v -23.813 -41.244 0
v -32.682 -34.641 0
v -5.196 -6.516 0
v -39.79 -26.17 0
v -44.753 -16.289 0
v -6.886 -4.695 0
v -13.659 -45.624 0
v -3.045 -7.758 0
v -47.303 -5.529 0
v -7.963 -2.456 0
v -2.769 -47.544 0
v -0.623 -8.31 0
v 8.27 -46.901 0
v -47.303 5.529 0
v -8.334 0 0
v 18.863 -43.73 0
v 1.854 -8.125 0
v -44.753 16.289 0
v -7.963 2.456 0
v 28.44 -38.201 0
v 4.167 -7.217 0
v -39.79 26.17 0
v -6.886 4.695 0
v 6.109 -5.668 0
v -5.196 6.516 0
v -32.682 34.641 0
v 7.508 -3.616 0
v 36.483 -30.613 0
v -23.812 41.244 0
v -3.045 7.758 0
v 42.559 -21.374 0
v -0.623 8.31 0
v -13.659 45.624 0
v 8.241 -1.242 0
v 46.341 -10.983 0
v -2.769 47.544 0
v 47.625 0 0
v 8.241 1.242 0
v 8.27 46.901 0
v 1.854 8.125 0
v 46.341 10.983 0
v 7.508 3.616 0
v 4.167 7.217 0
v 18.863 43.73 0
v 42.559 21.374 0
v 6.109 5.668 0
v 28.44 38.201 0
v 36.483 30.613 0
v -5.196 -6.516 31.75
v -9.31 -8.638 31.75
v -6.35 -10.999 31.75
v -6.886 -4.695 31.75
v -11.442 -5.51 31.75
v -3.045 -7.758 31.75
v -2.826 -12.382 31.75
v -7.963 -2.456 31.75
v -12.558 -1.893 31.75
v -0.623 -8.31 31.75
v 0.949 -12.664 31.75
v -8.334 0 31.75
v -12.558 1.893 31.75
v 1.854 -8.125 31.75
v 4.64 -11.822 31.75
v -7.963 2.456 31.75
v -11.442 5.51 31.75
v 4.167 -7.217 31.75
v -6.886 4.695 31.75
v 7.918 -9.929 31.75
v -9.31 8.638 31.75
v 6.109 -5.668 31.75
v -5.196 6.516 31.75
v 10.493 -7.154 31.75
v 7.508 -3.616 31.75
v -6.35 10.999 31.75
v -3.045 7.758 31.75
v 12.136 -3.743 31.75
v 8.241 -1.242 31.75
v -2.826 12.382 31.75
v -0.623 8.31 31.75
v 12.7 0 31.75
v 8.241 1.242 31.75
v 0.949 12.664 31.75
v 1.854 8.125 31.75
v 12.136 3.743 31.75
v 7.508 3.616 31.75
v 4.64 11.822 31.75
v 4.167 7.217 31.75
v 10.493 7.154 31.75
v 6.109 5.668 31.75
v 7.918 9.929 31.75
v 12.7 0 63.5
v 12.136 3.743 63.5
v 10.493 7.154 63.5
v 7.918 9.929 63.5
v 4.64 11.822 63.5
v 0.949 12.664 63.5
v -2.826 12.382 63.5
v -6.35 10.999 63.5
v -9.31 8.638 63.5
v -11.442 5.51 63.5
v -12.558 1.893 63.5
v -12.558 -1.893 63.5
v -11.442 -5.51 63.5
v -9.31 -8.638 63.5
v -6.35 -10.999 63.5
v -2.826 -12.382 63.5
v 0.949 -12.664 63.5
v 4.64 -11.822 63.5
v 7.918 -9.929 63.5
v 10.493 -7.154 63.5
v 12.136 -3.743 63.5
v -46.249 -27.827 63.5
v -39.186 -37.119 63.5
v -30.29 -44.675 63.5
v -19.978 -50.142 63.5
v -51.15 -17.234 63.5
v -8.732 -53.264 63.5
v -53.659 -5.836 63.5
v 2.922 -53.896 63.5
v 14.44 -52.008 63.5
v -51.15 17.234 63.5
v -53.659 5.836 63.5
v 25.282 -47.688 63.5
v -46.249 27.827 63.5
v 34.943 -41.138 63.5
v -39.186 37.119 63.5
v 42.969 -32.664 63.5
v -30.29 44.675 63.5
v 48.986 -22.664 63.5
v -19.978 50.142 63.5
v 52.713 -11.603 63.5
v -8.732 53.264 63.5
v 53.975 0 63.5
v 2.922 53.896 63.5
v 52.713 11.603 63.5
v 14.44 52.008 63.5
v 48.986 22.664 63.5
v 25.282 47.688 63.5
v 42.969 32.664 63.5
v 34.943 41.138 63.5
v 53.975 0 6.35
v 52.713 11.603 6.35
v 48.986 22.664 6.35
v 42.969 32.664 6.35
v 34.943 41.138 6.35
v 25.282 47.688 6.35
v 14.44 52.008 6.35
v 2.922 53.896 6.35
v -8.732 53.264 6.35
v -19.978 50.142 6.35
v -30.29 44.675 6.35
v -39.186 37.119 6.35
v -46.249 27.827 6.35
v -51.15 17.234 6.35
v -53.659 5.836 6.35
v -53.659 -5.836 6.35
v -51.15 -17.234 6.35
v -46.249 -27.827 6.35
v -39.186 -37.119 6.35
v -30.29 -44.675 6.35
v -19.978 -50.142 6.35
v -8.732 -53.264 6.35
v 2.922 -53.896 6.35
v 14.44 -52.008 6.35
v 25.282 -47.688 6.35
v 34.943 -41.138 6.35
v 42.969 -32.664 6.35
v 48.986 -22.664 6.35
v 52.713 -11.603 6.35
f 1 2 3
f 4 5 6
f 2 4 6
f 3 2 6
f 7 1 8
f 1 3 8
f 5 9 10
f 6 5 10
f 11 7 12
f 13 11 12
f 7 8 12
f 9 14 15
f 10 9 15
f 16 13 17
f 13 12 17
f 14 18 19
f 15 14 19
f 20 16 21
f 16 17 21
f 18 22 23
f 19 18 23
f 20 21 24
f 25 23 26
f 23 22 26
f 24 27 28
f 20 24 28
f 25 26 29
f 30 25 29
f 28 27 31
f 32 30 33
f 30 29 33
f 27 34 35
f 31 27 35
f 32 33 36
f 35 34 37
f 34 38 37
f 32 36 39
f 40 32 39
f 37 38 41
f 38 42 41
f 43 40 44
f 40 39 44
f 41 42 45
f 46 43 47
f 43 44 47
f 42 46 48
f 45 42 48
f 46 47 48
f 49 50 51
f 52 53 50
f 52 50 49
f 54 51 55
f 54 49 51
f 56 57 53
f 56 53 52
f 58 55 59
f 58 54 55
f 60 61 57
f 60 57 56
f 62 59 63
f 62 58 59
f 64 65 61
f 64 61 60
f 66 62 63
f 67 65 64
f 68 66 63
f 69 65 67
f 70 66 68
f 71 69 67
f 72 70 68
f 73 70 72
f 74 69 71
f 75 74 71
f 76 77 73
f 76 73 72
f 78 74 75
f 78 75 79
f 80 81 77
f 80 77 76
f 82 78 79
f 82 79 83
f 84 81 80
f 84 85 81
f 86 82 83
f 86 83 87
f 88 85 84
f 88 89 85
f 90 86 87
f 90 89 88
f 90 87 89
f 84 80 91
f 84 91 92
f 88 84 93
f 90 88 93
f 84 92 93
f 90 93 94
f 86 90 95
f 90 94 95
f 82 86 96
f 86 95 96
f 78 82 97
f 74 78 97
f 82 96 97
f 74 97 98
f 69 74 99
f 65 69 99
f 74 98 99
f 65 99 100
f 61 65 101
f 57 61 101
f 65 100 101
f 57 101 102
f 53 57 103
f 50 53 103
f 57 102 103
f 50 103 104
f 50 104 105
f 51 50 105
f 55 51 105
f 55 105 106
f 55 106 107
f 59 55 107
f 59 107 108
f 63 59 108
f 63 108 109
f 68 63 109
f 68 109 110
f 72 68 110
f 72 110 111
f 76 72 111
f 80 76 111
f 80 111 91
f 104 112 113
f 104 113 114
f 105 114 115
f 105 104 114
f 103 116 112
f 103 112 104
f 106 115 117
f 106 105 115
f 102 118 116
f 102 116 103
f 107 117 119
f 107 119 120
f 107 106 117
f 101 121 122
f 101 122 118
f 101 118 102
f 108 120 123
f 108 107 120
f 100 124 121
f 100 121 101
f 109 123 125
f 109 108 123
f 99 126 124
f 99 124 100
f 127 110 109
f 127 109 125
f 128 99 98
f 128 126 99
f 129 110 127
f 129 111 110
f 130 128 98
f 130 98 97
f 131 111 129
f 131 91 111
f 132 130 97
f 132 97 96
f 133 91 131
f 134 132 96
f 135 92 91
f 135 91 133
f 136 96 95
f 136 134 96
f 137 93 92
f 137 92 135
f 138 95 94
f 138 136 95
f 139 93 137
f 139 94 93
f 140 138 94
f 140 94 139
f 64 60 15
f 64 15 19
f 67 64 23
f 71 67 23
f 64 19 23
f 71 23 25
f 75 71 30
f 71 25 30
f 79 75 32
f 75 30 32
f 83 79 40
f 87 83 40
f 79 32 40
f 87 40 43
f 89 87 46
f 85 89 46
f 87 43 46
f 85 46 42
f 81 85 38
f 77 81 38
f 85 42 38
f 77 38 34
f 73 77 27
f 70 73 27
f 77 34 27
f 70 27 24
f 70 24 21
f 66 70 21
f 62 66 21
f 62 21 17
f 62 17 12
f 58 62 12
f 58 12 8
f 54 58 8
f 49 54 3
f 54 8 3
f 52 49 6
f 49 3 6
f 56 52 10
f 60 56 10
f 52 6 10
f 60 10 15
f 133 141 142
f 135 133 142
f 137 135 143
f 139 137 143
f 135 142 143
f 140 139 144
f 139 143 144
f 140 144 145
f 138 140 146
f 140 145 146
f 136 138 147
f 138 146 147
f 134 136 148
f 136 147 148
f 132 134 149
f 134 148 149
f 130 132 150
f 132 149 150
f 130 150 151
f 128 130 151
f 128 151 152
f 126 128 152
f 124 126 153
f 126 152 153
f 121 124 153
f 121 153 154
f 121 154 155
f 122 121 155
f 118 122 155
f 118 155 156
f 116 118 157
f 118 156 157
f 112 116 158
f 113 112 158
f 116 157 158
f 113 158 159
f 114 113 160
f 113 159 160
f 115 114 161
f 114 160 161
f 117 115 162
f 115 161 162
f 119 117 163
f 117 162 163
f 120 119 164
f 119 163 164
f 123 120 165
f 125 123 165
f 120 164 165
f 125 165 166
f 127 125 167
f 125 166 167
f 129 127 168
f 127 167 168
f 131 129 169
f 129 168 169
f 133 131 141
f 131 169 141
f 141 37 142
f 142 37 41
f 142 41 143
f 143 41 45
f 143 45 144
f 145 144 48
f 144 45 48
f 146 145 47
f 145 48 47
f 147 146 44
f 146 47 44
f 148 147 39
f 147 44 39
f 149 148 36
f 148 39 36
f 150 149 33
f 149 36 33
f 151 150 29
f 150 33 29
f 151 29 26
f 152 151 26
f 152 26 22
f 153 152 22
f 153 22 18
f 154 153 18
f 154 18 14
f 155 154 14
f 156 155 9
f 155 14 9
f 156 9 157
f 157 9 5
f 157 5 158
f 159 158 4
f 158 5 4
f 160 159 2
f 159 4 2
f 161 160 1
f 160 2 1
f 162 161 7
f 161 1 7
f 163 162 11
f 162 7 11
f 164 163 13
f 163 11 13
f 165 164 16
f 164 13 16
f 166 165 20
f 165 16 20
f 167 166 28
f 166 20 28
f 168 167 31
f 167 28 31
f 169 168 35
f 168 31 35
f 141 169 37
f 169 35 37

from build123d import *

# Parameters (mm, degrees)
F0_R           = 53.975
F1_DEPTH       = 63.5
F3_D           = 16.66748
F3_CBORE_D     = 25.4
F3_CBORE_DEPTH = 31.75
F4_SIZE        = 6.35


with BuildPart() as f1:
    # F0 (on Top) → F1 (new body)
    with BuildSketch(Plane.XY):
        Circle(F0_R)
    extrude(amount=F1_DEPTH)

    # F3 (through all)
    with Locations(Plane.XY.offset(63.5)):
        with Locations((0, 0)):
            CounterBoreHole(F3_D / 2, F3_CBORE_D / 2, F3_CBORE_DEPTH)

    # F4
    f4_edges = [f1.edges().sort_by_distance(p)[0] for p in [
        (-53.975, 0, 0),
    ]]
    chamfer(f4_edges, length=F4_SIZE)


solid = f1.part
